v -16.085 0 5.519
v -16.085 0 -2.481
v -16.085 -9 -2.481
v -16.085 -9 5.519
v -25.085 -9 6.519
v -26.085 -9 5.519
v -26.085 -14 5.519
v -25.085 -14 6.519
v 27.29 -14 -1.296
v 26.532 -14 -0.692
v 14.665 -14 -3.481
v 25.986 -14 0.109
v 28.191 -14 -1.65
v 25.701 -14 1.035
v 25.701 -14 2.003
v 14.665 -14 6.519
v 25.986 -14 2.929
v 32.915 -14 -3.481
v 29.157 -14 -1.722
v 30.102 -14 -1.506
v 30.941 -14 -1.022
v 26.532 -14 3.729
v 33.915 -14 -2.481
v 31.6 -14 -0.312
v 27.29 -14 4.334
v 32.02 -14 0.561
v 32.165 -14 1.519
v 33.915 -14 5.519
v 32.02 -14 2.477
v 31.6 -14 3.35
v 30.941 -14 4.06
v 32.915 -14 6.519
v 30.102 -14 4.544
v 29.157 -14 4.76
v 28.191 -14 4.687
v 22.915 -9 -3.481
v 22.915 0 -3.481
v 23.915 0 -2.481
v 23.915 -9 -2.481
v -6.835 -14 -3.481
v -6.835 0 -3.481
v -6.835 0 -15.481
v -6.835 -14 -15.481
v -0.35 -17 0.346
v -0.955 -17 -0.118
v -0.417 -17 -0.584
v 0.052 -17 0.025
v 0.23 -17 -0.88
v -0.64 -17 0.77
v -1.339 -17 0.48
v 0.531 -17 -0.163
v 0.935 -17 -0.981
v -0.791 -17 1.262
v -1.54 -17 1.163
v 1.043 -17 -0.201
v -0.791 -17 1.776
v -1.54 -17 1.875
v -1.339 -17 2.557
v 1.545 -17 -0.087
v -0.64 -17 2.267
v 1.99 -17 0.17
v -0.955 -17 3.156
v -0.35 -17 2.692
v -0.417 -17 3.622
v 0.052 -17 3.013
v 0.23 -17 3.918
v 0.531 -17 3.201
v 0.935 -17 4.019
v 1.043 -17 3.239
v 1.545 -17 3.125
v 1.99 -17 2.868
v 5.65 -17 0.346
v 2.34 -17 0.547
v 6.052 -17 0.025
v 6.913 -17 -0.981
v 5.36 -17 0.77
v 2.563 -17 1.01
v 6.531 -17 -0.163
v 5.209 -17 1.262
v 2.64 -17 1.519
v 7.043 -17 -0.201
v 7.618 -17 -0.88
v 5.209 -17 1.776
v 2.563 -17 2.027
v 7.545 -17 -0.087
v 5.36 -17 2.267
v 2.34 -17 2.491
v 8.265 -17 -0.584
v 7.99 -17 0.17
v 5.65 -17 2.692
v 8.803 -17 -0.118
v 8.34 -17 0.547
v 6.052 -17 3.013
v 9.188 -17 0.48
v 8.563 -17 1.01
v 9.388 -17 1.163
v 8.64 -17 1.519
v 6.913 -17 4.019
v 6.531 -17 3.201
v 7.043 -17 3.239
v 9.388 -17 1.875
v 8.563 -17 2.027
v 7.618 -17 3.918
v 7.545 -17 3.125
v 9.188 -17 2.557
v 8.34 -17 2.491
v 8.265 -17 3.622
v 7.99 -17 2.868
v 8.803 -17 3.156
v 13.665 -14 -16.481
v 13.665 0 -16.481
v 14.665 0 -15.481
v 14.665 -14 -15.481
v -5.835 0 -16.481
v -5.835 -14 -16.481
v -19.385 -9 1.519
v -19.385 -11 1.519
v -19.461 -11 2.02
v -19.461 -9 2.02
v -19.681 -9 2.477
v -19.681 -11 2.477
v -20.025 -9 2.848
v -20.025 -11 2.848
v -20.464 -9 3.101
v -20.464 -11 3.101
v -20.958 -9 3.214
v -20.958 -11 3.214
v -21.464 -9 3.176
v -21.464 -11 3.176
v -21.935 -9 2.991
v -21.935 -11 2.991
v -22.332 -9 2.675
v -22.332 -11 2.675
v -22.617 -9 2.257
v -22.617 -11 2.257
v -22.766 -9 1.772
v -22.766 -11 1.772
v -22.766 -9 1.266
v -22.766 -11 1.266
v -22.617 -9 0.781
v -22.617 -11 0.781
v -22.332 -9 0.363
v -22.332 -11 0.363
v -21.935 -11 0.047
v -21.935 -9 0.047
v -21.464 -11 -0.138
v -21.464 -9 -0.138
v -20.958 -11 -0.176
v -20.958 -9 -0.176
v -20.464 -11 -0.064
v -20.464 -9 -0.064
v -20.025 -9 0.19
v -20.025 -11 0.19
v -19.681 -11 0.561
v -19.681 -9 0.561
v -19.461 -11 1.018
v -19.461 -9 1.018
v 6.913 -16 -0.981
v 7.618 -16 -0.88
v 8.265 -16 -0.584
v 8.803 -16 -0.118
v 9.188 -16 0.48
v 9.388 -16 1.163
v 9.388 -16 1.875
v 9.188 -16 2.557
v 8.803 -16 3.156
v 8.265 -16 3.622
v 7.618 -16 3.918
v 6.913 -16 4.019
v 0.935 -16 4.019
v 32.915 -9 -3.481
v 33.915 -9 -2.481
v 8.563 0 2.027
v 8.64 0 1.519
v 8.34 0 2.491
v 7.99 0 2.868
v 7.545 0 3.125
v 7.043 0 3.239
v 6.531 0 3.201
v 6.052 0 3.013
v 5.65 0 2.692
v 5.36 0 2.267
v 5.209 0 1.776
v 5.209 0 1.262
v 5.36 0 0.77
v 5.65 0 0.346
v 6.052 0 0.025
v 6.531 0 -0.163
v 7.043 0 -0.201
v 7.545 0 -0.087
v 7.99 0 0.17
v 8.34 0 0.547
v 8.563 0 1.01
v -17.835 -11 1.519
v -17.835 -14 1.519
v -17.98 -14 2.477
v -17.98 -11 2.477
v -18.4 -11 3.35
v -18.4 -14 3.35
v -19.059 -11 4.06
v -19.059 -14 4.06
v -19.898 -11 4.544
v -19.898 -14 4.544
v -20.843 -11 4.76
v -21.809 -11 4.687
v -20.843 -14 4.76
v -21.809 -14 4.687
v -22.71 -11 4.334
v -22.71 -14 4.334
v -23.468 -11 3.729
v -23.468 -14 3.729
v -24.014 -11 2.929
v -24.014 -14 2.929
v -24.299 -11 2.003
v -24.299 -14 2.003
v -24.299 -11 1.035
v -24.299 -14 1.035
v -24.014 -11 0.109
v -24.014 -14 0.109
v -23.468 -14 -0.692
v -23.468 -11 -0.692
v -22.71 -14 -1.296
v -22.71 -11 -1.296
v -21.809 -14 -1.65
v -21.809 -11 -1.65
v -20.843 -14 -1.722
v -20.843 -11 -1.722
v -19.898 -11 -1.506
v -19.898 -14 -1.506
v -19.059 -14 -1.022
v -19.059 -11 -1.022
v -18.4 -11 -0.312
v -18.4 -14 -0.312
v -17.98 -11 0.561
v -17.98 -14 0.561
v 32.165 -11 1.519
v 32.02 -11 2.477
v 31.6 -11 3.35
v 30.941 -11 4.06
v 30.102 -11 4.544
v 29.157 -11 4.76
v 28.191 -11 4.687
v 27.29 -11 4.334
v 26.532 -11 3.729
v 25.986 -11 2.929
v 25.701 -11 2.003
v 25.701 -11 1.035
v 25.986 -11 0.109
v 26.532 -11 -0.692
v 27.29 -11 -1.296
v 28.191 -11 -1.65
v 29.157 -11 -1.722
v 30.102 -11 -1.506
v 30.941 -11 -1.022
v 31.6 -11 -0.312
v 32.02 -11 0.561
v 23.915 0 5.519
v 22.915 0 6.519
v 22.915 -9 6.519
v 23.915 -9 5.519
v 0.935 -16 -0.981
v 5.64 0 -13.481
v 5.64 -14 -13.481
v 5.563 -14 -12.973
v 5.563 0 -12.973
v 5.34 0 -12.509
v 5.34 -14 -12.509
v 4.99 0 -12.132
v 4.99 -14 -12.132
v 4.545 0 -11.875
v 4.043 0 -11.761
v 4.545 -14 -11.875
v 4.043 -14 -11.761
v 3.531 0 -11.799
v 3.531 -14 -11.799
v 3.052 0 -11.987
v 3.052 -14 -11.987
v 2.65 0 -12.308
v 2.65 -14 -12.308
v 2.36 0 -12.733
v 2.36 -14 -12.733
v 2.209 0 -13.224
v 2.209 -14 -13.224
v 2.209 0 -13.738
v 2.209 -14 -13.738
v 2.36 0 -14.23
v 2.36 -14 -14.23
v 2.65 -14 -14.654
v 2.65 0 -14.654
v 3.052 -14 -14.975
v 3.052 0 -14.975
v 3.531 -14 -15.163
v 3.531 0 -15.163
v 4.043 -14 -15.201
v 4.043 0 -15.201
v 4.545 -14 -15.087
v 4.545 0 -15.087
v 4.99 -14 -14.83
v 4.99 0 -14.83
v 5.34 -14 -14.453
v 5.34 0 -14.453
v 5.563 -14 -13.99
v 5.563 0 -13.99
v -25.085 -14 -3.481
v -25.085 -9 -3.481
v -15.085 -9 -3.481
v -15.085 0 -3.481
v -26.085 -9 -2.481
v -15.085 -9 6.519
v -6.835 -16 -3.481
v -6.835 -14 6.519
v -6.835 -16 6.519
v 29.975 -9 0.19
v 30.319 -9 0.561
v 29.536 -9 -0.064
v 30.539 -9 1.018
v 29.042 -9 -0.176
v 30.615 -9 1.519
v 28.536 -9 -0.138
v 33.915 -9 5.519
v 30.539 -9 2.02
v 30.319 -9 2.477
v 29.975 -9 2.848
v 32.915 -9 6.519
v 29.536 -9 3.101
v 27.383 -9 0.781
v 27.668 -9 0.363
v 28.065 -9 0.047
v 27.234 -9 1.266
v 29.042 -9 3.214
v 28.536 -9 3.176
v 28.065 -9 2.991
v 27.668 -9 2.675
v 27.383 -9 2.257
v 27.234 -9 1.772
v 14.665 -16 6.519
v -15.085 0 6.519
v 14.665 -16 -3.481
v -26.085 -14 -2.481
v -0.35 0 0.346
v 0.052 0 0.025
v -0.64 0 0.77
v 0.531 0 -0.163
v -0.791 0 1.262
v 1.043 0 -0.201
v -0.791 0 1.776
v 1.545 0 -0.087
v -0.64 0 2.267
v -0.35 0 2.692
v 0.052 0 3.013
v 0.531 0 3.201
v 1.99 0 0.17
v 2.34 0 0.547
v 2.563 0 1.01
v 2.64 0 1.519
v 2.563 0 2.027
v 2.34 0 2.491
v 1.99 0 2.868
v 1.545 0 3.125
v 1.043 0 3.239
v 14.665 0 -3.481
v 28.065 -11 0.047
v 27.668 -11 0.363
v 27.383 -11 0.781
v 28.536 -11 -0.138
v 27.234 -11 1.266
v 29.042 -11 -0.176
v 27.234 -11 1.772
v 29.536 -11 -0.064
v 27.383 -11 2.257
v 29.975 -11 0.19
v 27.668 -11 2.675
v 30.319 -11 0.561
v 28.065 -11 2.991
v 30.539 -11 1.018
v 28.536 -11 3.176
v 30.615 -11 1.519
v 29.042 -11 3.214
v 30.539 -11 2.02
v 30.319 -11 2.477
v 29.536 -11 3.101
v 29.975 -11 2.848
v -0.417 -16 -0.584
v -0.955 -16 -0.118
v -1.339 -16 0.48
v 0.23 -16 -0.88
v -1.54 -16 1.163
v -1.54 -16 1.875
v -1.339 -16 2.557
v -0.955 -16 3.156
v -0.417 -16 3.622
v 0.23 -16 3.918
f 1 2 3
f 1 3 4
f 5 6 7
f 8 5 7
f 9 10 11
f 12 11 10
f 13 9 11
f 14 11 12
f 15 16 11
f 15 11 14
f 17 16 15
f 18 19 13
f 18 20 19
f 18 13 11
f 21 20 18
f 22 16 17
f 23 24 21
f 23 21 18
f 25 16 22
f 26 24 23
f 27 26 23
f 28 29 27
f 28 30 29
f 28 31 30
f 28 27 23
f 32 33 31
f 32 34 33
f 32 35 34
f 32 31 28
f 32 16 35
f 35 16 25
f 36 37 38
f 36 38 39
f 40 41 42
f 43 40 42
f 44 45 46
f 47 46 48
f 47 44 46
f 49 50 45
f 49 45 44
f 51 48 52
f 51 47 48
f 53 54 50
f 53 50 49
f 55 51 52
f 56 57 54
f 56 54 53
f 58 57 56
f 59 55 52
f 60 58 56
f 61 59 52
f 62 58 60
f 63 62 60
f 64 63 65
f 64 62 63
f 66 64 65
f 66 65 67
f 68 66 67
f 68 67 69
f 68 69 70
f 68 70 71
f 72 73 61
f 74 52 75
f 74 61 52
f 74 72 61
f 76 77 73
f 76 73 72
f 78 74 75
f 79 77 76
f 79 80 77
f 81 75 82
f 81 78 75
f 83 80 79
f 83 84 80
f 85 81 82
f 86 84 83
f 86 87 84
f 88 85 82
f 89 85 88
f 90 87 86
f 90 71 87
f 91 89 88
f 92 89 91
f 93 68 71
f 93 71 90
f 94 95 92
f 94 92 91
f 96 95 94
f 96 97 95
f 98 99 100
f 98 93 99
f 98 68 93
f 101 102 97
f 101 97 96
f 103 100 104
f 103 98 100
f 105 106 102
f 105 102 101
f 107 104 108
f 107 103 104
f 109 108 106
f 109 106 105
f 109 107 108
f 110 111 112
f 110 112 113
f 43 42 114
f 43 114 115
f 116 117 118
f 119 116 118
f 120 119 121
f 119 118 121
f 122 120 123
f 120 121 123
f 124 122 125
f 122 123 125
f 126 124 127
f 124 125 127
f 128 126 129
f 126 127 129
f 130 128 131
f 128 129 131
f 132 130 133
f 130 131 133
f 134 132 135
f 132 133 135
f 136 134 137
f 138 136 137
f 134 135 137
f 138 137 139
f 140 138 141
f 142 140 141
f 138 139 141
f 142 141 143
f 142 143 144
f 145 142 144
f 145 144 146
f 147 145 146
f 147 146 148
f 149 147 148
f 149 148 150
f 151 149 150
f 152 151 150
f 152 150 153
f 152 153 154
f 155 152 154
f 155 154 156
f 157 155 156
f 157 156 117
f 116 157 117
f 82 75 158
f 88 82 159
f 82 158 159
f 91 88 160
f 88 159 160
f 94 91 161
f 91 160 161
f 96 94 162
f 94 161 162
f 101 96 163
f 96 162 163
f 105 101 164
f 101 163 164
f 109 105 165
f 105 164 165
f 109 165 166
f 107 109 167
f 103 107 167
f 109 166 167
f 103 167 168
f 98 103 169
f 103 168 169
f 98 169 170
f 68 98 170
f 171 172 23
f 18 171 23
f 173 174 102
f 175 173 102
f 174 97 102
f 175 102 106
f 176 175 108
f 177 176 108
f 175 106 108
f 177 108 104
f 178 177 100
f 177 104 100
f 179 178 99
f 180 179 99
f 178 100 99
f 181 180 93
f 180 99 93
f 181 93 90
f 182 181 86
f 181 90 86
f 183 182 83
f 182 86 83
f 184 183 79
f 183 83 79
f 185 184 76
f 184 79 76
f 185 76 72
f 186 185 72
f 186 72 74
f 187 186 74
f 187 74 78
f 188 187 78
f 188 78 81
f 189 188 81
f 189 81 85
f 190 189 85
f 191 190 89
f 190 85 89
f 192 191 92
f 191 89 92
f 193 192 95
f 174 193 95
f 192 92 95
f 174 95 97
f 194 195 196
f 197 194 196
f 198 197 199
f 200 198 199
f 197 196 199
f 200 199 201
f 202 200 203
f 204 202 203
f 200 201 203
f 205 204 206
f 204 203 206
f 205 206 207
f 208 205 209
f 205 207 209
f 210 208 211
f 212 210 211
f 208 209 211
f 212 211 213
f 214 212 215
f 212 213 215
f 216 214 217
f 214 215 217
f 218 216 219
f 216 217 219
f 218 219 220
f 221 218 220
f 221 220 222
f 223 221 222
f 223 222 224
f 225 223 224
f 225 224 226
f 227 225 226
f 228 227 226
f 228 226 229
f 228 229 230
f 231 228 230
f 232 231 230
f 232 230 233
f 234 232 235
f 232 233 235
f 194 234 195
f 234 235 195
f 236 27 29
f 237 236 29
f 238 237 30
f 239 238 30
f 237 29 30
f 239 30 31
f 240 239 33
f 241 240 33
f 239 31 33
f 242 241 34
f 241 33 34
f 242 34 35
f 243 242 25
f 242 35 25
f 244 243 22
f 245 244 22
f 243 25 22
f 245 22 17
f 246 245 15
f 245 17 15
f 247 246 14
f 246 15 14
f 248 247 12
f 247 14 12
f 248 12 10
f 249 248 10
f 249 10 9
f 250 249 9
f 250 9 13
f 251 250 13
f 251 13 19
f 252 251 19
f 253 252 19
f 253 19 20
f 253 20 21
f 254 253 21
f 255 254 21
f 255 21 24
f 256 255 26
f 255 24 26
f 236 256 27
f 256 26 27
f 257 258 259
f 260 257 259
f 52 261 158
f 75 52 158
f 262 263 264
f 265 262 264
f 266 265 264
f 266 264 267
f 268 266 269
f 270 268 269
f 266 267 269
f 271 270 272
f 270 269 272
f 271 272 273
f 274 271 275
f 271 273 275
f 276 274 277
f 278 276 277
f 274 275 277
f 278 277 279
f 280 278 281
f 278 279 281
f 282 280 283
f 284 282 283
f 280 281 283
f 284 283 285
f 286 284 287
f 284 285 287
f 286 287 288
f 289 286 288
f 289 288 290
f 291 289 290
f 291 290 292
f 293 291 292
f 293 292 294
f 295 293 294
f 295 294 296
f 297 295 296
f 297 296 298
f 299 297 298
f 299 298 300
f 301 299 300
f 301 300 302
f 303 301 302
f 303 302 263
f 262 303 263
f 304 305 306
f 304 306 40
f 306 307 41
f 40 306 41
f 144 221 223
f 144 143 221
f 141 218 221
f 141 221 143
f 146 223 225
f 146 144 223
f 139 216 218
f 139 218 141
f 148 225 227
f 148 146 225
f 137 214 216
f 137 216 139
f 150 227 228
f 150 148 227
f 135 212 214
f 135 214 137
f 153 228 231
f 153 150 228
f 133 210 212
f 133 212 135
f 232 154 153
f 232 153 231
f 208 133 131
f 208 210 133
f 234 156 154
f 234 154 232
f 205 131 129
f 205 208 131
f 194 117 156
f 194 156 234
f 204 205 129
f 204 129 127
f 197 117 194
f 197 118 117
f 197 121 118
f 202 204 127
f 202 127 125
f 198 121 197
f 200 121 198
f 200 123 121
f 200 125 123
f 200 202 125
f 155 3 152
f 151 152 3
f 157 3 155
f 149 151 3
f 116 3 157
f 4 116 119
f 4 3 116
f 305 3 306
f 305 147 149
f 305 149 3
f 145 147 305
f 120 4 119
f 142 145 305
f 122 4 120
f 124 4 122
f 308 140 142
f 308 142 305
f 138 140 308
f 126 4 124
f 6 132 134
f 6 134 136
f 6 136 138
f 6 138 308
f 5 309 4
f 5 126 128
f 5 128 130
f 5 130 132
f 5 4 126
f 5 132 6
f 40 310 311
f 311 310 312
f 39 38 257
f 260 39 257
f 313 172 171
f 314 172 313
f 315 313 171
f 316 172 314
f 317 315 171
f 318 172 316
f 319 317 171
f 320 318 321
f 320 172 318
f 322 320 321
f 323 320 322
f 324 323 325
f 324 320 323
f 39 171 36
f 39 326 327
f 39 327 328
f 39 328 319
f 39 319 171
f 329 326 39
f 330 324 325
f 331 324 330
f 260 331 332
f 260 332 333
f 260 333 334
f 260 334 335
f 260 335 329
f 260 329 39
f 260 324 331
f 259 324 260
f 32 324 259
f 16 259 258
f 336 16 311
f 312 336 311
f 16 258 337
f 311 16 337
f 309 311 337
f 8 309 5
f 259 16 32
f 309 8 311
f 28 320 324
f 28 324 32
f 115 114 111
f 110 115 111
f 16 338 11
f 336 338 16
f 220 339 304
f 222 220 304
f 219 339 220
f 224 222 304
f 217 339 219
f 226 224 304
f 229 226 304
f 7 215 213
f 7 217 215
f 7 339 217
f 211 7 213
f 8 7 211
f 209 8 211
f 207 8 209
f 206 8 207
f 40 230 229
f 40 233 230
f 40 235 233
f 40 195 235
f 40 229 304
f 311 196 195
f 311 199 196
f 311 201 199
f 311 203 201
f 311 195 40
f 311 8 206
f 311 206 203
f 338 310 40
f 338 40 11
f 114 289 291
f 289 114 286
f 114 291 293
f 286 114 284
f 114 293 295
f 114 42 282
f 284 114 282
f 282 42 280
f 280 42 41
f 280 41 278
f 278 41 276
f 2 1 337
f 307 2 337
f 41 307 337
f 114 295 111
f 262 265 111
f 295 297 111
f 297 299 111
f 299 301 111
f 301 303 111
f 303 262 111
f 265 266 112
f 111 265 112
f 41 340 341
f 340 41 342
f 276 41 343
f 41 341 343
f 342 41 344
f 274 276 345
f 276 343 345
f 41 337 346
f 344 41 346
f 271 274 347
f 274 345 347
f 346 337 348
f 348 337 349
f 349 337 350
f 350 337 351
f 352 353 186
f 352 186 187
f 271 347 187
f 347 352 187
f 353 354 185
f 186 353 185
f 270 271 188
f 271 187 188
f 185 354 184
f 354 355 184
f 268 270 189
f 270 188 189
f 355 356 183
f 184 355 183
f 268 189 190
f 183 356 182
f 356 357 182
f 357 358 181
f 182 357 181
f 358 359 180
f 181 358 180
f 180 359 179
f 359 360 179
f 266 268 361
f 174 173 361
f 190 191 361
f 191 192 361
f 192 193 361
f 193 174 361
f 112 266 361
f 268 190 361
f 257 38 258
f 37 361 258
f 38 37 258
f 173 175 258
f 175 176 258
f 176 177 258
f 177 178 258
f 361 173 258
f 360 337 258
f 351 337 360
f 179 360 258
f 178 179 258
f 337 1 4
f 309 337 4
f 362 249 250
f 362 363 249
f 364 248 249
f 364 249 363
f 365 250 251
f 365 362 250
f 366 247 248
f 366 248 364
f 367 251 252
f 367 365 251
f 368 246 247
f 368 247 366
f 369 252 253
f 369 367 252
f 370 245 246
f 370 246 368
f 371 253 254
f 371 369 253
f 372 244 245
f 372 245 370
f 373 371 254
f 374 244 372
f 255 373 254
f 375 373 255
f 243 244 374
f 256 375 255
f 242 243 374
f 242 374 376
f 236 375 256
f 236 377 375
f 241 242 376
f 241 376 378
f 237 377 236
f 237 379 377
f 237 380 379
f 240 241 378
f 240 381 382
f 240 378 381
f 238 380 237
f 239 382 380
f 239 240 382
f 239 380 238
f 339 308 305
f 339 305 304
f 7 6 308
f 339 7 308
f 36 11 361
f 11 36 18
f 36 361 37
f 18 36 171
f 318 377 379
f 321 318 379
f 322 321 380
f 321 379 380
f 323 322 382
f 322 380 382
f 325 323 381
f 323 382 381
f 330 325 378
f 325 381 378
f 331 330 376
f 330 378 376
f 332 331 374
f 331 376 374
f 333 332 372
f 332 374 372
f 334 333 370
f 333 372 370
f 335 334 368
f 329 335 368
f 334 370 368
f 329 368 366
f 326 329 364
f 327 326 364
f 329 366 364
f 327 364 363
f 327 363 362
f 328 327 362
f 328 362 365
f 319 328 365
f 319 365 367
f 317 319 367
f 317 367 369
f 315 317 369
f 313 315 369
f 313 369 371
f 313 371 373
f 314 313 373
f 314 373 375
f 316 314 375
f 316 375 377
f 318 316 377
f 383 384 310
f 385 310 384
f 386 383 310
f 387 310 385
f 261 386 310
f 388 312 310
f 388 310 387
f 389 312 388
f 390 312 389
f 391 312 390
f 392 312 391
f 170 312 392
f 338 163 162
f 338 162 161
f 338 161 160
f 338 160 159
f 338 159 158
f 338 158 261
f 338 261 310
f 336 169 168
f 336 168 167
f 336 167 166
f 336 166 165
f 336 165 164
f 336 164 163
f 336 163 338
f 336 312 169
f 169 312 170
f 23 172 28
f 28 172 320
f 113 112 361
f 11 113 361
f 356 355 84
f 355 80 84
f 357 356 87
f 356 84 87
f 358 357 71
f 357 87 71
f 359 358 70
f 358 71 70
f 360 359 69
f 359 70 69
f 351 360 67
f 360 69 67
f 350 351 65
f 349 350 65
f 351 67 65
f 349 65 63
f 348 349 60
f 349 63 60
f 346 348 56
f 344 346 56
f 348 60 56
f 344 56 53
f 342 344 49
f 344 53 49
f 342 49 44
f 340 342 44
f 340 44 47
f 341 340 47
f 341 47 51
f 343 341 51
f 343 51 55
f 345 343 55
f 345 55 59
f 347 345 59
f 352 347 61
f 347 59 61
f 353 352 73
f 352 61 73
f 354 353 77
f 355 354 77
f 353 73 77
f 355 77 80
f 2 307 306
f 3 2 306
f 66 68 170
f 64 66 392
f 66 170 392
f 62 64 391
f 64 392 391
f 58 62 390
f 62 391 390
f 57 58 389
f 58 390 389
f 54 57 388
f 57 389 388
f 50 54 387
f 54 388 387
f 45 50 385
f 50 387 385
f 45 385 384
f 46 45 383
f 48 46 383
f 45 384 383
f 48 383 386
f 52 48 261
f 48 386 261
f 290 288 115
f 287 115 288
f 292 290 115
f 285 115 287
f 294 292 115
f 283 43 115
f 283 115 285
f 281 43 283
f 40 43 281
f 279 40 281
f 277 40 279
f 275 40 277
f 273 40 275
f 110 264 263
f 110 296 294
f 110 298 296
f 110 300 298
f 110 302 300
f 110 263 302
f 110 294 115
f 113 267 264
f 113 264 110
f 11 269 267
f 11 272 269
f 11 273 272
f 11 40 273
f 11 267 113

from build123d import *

# Parameters (mm, degrees)
F1_DEPTH  = 16
F2_W      = 21.5
F2_H      = 13
F2_W_2    = 19.25
F2_H_2    = 10
F3_DEPTH  = 2
F4_R      = 3.25
F5_DEPTH  = 3
F6_R      = 1.7
F7_R      = 1.7
F8_DEPTH  = 25
F9_W      = 10
F9_H      = 10
F9_R      = 1.7
F10_DEPTH = 9
F13_DEPTH = 17
F11_R     = 1.725
F14_DEPTH = 15
F15_R     = 1.725
F16_DEPTH = 25
F17_SIZE  = 1


with BuildPart() as f1:
    # F0 (on Front) → F1 (new body)
    with BuildSketch(Plane.XZ):
        Polygon((33.9145704359, 6.5189368035), (-26.0854295641, 6.5189368035), (-26.0854295641, -3.4810631965), (-6.8354295641, -3.4810631965), (-6.8354295641, -16.4810631965), (14.6645704359, -16.4810631965), (14.6645704359, -3.4810631965), (33.9145704359, -3.4810631965), align=None)
    extrude(amount=F1_DEPTH)

    # F2 (on face) → F3 (cut)
    with BuildSketch(Plane.XZ.offset(16)):
        with Locations((3.9145704359, -9.9810631965)):
            Rectangle(F2_W, F2_H)
        with Locations((-16.4604295641, 1.5189368035)):
            Rectangle(F2_W_2, F2_H_2)
        with Locations((24.2895704359, 1.5189368035)):
            Rectangle(F2_W_2, F2_H_2)
    extrude(amount=-F3_DEPTH, mode=Mode.SUBTRACT)

    # F4 (on face) → F5 (cut)
    with BuildSketch(Plane.XZ.offset(14)):
        with Locations((-21.0854295641, 1.5189368035)):
            Circle(F4_R)
        with Locations((28.9145704359, 1.5189368035)):
            Circle(F4_R)
    extrude(amount=-F5_DEPTH, mode=Mode.SUBTRACT)

    # F6 (on face) + F7 (on face) → F8 (cut)
    with BuildSketch(Plane.XZ.offset(11)):
        with Locations((-21.0854295641, 1.5189368035)):
            Circle(F6_R)
    with BuildSketch(Plane.XZ.offset(11)):
        with Locations((28.9145704359, 1.5189368035)):
            Circle(F7_R)
    extrude(amount=-F8_DEPTH, mode=Mode.SUBTRACT)

    # F9 (on face) → F10 (cut)
    with BuildSketch(Plane(origin=(0, 0, 0), x_dir=(-1, 0, 0), z_dir=(0, 1, 0))):
        with Locations((21.0854295641, 1.5189368035)):
            Rectangle(F9_W, F9_H)
        with Locations((21.0854295641, 1.5189368035)):
            Circle(F9_R, mode=Mode.SUBTRACT)
        with Locations((-28.9145704359, 1.5189368035)):
            Rectangle(F9_W, F9_H)
        with Locations((-28.9145704359, 1.5189368035)):
            Circle(F9_R, mode=Mode.SUBTRACT)
    extrude(amount=-F10_DEPTH, mode=Mode.SUBTRACT)

    # F12 (on Front) → F13 (join)
    with BuildSketch(Plane.XZ):
        with BuildLine():
            Line((0.9346461738, -0.9810631965), (6.9134989753, -0.9810631965))
            ThreePointArc((6.9134989753, -0.9810631965), (9.4134989753, 1.5189368035), (6.9134989753, 4.0189368035))
            Line((6.9134989753, 4.0189368035), (0.9346461738, 4.0189368035))
            ThreePointArc((0.9346461738, 4.0189368035), (-1.5653538262, 1.5189368035), (0.9346461738, -0.9810631965))
        make_face()
    extrude(amount=F13_DEPTH)

    # F11 (on face) → F14 (cut, symmetric)
    with BuildSketch(Plane.XZ.offset(14)):
        with Locations((0.9145704359, 1.5189368035)):
            Circle(F11_R)
        with Locations((6.9145704359, 1.5189368035)):
            Circle(F11_R)
    extrude(amount=F14_DEPTH, both=True, mode=Mode.SUBTRACT)

    # F15 (on face) → F16 (cut)
    with BuildSketch(Plane.XZ.offset(14)):
        with Locations((3.9145704359, -13.4810631965)):
            Circle(F15_R)
    extrude(amount=-F16_DEPTH, mode=Mode.SUBTRACT)

    # F17
    f17_edges = [f1.edges().sort_by_distance(p)[0] for p in [
        (-6.83543, -7, -16.481063),
        (14.66457, -7, -16.481063),
        (33.91457, -11.5, -3.481063),
        (33.91457, -11.5, 6.518937),
        (-26.08543, -11.5, 6.518937),
        (-26.08543, -11.5, -3.481063),
        (-16.08543, -4.5, -3.481063),
        (-16.08543, -4.5, 6.518937),
        (23.91457, -4.5, 6.518937),
        (23.91457, -4.5, -3.481063),
    ]]
    chamfer(f17_edges, length=F17_SIZE)


solid = f1.part
